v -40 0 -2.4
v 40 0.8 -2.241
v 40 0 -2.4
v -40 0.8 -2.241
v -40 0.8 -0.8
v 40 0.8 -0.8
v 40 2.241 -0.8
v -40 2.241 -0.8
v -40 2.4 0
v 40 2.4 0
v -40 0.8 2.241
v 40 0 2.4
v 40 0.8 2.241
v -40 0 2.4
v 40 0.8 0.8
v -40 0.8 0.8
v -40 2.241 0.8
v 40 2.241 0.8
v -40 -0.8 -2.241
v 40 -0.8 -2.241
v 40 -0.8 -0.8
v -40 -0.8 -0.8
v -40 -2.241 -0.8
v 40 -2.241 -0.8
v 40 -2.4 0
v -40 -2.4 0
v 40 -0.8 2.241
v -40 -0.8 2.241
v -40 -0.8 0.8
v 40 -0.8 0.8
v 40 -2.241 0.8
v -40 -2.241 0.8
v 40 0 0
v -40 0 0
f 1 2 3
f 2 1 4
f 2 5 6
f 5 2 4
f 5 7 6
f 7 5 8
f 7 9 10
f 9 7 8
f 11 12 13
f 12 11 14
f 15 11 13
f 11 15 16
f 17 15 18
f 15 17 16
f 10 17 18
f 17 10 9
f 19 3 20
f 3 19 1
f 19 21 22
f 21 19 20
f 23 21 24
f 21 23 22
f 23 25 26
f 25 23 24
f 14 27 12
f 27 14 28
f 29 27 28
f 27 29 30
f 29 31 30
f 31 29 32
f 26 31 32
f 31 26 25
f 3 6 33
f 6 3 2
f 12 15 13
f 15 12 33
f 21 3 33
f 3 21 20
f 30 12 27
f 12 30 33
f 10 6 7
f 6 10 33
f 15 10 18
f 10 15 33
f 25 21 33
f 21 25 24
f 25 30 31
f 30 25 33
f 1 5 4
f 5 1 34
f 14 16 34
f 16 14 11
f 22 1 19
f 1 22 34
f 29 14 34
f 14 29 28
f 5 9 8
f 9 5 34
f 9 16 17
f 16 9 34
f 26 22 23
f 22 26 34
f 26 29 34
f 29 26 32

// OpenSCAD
// file: ../p/axle.scad
use <../lib.scad>
function ldraw_lib__axle() = [
// 0 Axle
// 0 Name: axle.dat
// 0 Author: James Jessiman
// 0 !LDRAW_ORG Primitive UPDATE 2003-01
// 0 !LICENSE Licensed under CC BY 2.0 and CC BY 4.0 : see CAreadme.txt
// 
// 0 BFC CERTIFY CCW
  [0,"BFC","CERTIFY"],
  [0,"BFC","CCW"],
// 
// 0 !HISTORY 2000-04-23 [sbliss] Added conditional edges along outermost diameters
// 0 !HISTORY 2000-05-07 [PTadmin] Official Update 2000-01
// 0 !HISTORY 2002-11-08 [OrionP] Adjusted fit and precision
// 0 !HISTORY 2003-03-12 [PTadmin] Official Update 2003-01
// 0 !HISTORY 2007-06-24 [PTadmin] Header formatted for Contributor Agreement
// 0 !HISTORY 2008-07-01 [PTadmin] Official Update 2008-01
// 
// 
// 5 24 6 0 0 6 1 0 5.602 0 2 5.602 0 -2
  [5,24,6,0,0,6,1,0,5.602,0,2,5.602,0,-2],
// 5 24 0 0 6 0 1 6 2 0 5.602 -2 0 5.602
  [5,24,0,0,6,0,1,6,2,0,5.602,-2,0,5.602],
// 5 24 -6 0 0 -6 1 0 -5.602 0 -2 -5.602 0 2
  [5,24,-6,0,0,-6,1,0,-5.602,0,-2,-5.602,0,2],
// 5 24 0 0 -6 0 1 -6 -2 0 -5.602 2 0 -5.602
  [5,24,0,0,-6,0,1,-6,-2,0,-5.602,2,0,-5.602],
// 
// 2 24 6 0 0 5.602 0 2
  [2,24,6,0,0,5.602,0,2],
// 2 24 5.602 0 2 2 0 2
  [2,24,5.602,0,2,2,0,2],
// 2 24 2 0 2 2 0 5.602
  [2,24,2,0,2,2,0,5.602],
// 2 24 2 0 5.602 0 0 6
  [2,24,2,0,5.602,0,0,6],
// 2 24 -6 0 0 -5.602 0 2
  [2,24,-6,0,0,-5.602,0,2],
// 2 24 -5.602 0 2 -2 0 2
  [2,24,-5.602,0,2,-2,0,2],
// 2 24 -2 0 2 -2 0 5.602
  [2,24,-2,0,2,-2,0,5.602],
// 2 24 -2 0 5.602 -0 0 6
  [2,24,-2,0,5.602,-0,0,6],
// 2 24 6 0 -0 5.602 0 -2
  [2,24,6,0,-0,5.602,0,-2],
// 2 24 5.602 0 -2 2 0 -2
  [2,24,5.602,0,-2,2,0,-2],
// 2 24 2 0 -2 2 0 -5.602
  [2,24,2,0,-2,2,0,-5.602],
// 2 24 2 0 -5.602 0 0 -6
  [2,24,2,0,-5.602,0,0,-6],
// 2 24 -6 0 -0 -5.602 0 -2
  [2,24,-6,0,-0,-5.602,0,-2],
// 2 24 -5.602 0 -2 -2 0 -2
  [2,24,-5.602,0,-2,-2,0,-2],
// 2 24 -2 0 -2 -2 0 -5.602
  [2,24,-2,0,-2,-2,0,-5.602],
// 2 24 -2 0 -5.602 -0 0 -6
  [2,24,-2,0,-5.602,-0,0,-6],
// 2 24 6 1 0 5.602 1 2
  [2,24,6,1,0,5.602,1,2],
// 2 24 5.602 1 2 2 1 2
  [2,24,5.602,1,2,2,1,2],
// 2 24 2 1 2 2 1 5.602
  [2,24,2,1,2,2,1,5.602],
// 2 24 2 1 5.602 0 1 6
  [2,24,2,1,5.602,0,1,6],
// 2 24 -6 1 0 -5.602 1 2
  [2,24,-6,1,0,-5.602,1,2],
// 2 24 -5.602 1 2 -2 1 2
  [2,24,-5.602,1,2,-2,1,2],
// 2 24 -2 1 2 -2 1 5.602
  [2,24,-2,1,2,-2,1,5.602],
// 2 24 -2 1 5.602 -0 1 6
  [2,24,-2,1,5.602,-0,1,6],
// 2 24 6 1 -0 5.602 1 -2
  [2,24,6,1,-0,5.602,1,-2],
// 2 24 5.602 1 -2 2 1 -2
  [2,24,5.602,1,-2,2,1,-2],
// 2 24 2 1 -2 2 1 -5.602
  [2,24,2,1,-2,2,1,-5.602],
// 2 24 2 1 -5.602 0 1 -6
  [2,24,2,1,-5.602,0,1,-6],
// 2 24 -6 1 -0 -5.602 1 -2
  [2,24,-6,1,-0,-5.602,1,-2],
// 2 24 -5.602 1 -2 -2 1 -2
  [2,24,-5.602,1,-2,-2,1,-2],
// 2 24 -2 1 -2 -2 1 -5.602
  [2,24,-2,1,-2,-2,1,-5.602],
// 2 24 -2 1 -5.602 -0 1 -6
  [2,24,-2,1,-5.602,-0,1,-6],
// 
// 2 24 5.602 0 2 5.602 1 2
  [2,24,5.602,0,2,5.602,1,2],
// 2 24 2 0 2 2 1 2
  [2,24,2,0,2,2,1,2],
// 2 24 2 0 5.602 2 1 5.602
  [2,24,2,0,5.602,2,1,5.602],
// 2 24 -5.602 0 2 -5.602 1 2
  [2,24,-5.602,0,2,-5.602,1,2],
// 2 24 -2 0 2 -2 1 2
  [2,24,-2,0,2,-2,1,2],
// 2 24 -2 0 5.602 -2 1 5.602
  [2,24,-2,0,5.602,-2,1,5.602],
// 2 24 5.602 0 -2 5.602 1 -2
  [2,24,5.602,0,-2,5.602,1,-2],
// 2 24 2 0 -2 2 1 -2
  [2,24,2,0,-2,2,1,-2],
// 2 24 2 0 -5.602 2 1 -5.602
  [2,24,2,0,-5.602,2,1,-5.602],
// 2 24 -5.602 0 -2 -5.602 1 -2
  [2,24,-5.602,0,-2,-5.602,1,-2],
// 2 24 -2 0 -2 -2 1 -2
  [2,24,-2,0,-2,-2,1,-2],
// 2 24 -2 0 -5.602 -2 1 -5.602
  [2,24,-2,0,-5.602,-2,1,-5.602],
// 
// 4 16 6 0 0 6 1 0 5.602 1 2 5.602 0 2
  [4,16,6,0,0,6,1,0,5.602,1,2,5.602,0,2],
// 4 16 5.602 0 2 5.602 1 2 2 1 2 2 0 2
  [4,16,5.602,0,2,5.602,1,2,2,1,2,2,0,2],
// 4 16 2 0 2 2 1 2 2 1 5.602 2 0 5.602
  [4,16,2,0,2,2,1,2,2,1,5.602,2,0,5.602],
// 4 16 2 0 5.602 2 1 5.602 0 1 6 0 0 6
  [4,16,2,0,5.602,2,1,5.602,0,1,6,0,0,6],
// 4 16 -6 0 0 -5.602 0 2 -5.602 1 2 -6 1 0
  [4,16,-6,0,0,-5.602,0,2,-5.602,1,2,-6,1,0],
// 4 16 -5.602 0 2 -2 0 2 -2 1 2 -5.602 1 2
  [4,16,-5.602,0,2,-2,0,2,-2,1,2,-5.602,1,2],
// 4 16 -2 0 2 -2 0 5.602 -2 1 5.602 -2 1 2
  [4,16,-2,0,2,-2,0,5.602,-2,1,5.602,-2,1,2],
// 4 16 -2 0 5.602 -0 0 6 -0 1 6 -2 1 5.602
  [4,16,-2,0,5.602,-0,0,6,-0,1,6,-2,1,5.602],
// 4 16 6 0 -0 5.602 0 -2 5.602 1 -2 6 1 -0
  [4,16,6,0,-0,5.602,0,-2,5.602,1,-2,6,1,-0],
// 4 16 5.602 0 -2 2 0 -2 2 1 -2 5.602 1 -2
  [4,16,5.602,0,-2,2,0,-2,2,1,-2,5.602,1,-2],
// 4 16 2 0 -2 2 0 -5.602 2 1 -5.602 2 1 -2
  [4,16,2,0,-2,2,0,-5.602,2,1,-5.602,2,1,-2],
// 4 16 2 0 -5.602 0 0 -6 0 1 -6 2 1 -5.602
  [4,16,2,0,-5.602,0,0,-6,0,1,-6,2,1,-5.602],
// 4 16 -6 0 -0 -6 1 -0 -5.602 1 -2 -5.602 0 -2
  [4,16,-6,0,-0,-6,1,-0,-5.602,1,-2,-5.602,0,-2],
// 4 16 -5.602 0 -2 -5.602 1 -2 -2 1 -2 -2 0 -2
  [4,16,-5.602,0,-2,-5.602,1,-2,-2,1,-2,-2,0,-2],
// 4 16 -2 0 -2 -2 1 -2 -2 1 -5.602 -2 0 -5.602
  [4,16,-2,0,-2,-2,1,-2,-2,1,-5.602,-2,0,-5.602],
// 4 16 -2 0 -5.602 -2 1 -5.602 -0 1 -6 -0 0 -6
  [4,16,-2,0,-5.602,-2,1,-5.602,-0,1,-6,-0,0,-6],
// 
// 4 16 6 0 0 5.602 0 2 2 0 2 0 0 0
  [4,16,6,0,0,5.602,0,2,2,0,2,0,0,0],
// 4 16 -6 0 0 0 0 0 -2 0 2 -5.602 0 2
  [4,16,-6,0,0,0,0,0,-2,0,2,-5.602,0,2],
// 4 16 6 0 0 0 0 0 2 0 -2 5.602 0 -2
  [4,16,6,0,0,0,0,0,2,0,-2,5.602,0,-2],
// 4 16 -6 0 0 -5.602 0 -2 -2 0 -2 0 0 0
  [4,16,-6,0,0,-5.602,0,-2,-2,0,-2,0,0,0],
// 4 16 0 0 6 0 0 0 2 0 2 2 0 5.602
  [4,16,0,0,6,0,0,0,2,0,2,2,0,5.602],
// 4 16 0 0 6 -2 0 5.602 -2 0 2 0 0 0
  [4,16,0,0,6,-2,0,5.602,-2,0,2,0,0,0],
// 4 16 0 0 -6 2 0 -5.602 2 0 -2 0 0 0
  [4,16,0,0,-6,2,0,-5.602,2,0,-2,0,0,0],
// 4 16 0 0 -6 0 0 0 -2 0 -2 -2 0 -5.602
  [4,16,0,0,-6,0,0,0,-2,0,-2,-2,0,-5.602],
// 4 16 6 1 0 0 1 0 2 1 2 5.602 1 2
  [4,16,6,1,0,0,1,0,2,1,2,5.602,1,2],
// 4 16 -6 1 0 -5.602 1 2 -2 1 2 0 1 0
  [4,16,-6,1,0,-5.602,1,2,-2,1,2,0,1,0],
// 4 16 6 1 0 5.602 1 -2 2 1 -2 0 1 0
  [4,16,6,1,0,5.602,1,-2,2,1,-2,0,1,0],
// 4 16 -6 1 0 0 1 0 -2 1 -2 -5.602 1 -2
  [4,16,-6,1,0,0,1,0,-2,1,-2,-5.602,1,-2],
// 4 16 0 1 6 2 1 5.602 2 1 2 0 1 0
  [4,16,0,1,6,2,1,5.602,2,1,2,0,1,0],
// 4 16 0 1 6 0 1 0 -2 1 2 -2 1 5.602
  [4,16,0,1,6,0,1,0,-2,1,2,-2,1,5.602],
// 4 16 0 1 -6 0 1 0 2 1 -2 2 1 -5.602
  [4,16,0,1,-6,0,1,0,2,1,-2,2,1,-5.602],
// 4 16 0 1 -6 -2 1 -5.602 -2 1 -2 0 1 0
  [4,16,0,1,-6,-2,1,-5.602,-2,1,-2,0,1,0],
// 0
];
module ldraw_lib__axle(step=0, col=false, unit=2/5, alt=false, line=0.2, solid=!$preview)
    makepoly(ldraw_lib__axle(), step=step, col=col, unit=unit, alt=alt, line=line, solid=solid);
ldraw_lib__axle(line=0.2);
// main file
use <../lib.scad>
use <../p/axle.scad>
function ldraw_lib__3737() = [
// 0 Technic Axle 10
// 0 Name: 3737.dat
// 0 Author: James Jessiman
// 0 !LDRAW_ORG Part UPDATE 2005-01
// 0 !LICENSE Licensed under CC BY 2.0 and CC BY 4.0 : see CAreadme.txt
// 
// 0 BFC CERTIFY CCW
  [0,"BFC","CERTIFY"],
  [0,"BFC","CCW"],
// 
// 0 !HISTORY 2004-07-11 [guyvivan] BFC'ed
// 0 !HISTORY 2005-12-28 [PTadmin] Official Update 2005-01
// 0 !HISTORY 2007-06-29 [PTadmin] Header formatted for Contributor Agreement
// 0 !HISTORY 2008-07-01 [PTadmin] Official Update 2008-01
// 
// 
// 1 16 100 0 0 0 -200 0 1 0 0 0 0 1 axle.dat
  [1,16,100,0,0,0,-200,0,1,0,0,0,0,1, ldraw_lib__axle()],
// 0
// 
];
module ldraw_lib__3737(step=0, col=false, unit=2/5, alt=false, line=0.2, solid=!$preview)
    makepoly(ldraw_lib__3737(), step=step, col=col, unit=unit, alt=alt, line=line, solid=solid);
ldraw_lib__3737(line=0.2);
